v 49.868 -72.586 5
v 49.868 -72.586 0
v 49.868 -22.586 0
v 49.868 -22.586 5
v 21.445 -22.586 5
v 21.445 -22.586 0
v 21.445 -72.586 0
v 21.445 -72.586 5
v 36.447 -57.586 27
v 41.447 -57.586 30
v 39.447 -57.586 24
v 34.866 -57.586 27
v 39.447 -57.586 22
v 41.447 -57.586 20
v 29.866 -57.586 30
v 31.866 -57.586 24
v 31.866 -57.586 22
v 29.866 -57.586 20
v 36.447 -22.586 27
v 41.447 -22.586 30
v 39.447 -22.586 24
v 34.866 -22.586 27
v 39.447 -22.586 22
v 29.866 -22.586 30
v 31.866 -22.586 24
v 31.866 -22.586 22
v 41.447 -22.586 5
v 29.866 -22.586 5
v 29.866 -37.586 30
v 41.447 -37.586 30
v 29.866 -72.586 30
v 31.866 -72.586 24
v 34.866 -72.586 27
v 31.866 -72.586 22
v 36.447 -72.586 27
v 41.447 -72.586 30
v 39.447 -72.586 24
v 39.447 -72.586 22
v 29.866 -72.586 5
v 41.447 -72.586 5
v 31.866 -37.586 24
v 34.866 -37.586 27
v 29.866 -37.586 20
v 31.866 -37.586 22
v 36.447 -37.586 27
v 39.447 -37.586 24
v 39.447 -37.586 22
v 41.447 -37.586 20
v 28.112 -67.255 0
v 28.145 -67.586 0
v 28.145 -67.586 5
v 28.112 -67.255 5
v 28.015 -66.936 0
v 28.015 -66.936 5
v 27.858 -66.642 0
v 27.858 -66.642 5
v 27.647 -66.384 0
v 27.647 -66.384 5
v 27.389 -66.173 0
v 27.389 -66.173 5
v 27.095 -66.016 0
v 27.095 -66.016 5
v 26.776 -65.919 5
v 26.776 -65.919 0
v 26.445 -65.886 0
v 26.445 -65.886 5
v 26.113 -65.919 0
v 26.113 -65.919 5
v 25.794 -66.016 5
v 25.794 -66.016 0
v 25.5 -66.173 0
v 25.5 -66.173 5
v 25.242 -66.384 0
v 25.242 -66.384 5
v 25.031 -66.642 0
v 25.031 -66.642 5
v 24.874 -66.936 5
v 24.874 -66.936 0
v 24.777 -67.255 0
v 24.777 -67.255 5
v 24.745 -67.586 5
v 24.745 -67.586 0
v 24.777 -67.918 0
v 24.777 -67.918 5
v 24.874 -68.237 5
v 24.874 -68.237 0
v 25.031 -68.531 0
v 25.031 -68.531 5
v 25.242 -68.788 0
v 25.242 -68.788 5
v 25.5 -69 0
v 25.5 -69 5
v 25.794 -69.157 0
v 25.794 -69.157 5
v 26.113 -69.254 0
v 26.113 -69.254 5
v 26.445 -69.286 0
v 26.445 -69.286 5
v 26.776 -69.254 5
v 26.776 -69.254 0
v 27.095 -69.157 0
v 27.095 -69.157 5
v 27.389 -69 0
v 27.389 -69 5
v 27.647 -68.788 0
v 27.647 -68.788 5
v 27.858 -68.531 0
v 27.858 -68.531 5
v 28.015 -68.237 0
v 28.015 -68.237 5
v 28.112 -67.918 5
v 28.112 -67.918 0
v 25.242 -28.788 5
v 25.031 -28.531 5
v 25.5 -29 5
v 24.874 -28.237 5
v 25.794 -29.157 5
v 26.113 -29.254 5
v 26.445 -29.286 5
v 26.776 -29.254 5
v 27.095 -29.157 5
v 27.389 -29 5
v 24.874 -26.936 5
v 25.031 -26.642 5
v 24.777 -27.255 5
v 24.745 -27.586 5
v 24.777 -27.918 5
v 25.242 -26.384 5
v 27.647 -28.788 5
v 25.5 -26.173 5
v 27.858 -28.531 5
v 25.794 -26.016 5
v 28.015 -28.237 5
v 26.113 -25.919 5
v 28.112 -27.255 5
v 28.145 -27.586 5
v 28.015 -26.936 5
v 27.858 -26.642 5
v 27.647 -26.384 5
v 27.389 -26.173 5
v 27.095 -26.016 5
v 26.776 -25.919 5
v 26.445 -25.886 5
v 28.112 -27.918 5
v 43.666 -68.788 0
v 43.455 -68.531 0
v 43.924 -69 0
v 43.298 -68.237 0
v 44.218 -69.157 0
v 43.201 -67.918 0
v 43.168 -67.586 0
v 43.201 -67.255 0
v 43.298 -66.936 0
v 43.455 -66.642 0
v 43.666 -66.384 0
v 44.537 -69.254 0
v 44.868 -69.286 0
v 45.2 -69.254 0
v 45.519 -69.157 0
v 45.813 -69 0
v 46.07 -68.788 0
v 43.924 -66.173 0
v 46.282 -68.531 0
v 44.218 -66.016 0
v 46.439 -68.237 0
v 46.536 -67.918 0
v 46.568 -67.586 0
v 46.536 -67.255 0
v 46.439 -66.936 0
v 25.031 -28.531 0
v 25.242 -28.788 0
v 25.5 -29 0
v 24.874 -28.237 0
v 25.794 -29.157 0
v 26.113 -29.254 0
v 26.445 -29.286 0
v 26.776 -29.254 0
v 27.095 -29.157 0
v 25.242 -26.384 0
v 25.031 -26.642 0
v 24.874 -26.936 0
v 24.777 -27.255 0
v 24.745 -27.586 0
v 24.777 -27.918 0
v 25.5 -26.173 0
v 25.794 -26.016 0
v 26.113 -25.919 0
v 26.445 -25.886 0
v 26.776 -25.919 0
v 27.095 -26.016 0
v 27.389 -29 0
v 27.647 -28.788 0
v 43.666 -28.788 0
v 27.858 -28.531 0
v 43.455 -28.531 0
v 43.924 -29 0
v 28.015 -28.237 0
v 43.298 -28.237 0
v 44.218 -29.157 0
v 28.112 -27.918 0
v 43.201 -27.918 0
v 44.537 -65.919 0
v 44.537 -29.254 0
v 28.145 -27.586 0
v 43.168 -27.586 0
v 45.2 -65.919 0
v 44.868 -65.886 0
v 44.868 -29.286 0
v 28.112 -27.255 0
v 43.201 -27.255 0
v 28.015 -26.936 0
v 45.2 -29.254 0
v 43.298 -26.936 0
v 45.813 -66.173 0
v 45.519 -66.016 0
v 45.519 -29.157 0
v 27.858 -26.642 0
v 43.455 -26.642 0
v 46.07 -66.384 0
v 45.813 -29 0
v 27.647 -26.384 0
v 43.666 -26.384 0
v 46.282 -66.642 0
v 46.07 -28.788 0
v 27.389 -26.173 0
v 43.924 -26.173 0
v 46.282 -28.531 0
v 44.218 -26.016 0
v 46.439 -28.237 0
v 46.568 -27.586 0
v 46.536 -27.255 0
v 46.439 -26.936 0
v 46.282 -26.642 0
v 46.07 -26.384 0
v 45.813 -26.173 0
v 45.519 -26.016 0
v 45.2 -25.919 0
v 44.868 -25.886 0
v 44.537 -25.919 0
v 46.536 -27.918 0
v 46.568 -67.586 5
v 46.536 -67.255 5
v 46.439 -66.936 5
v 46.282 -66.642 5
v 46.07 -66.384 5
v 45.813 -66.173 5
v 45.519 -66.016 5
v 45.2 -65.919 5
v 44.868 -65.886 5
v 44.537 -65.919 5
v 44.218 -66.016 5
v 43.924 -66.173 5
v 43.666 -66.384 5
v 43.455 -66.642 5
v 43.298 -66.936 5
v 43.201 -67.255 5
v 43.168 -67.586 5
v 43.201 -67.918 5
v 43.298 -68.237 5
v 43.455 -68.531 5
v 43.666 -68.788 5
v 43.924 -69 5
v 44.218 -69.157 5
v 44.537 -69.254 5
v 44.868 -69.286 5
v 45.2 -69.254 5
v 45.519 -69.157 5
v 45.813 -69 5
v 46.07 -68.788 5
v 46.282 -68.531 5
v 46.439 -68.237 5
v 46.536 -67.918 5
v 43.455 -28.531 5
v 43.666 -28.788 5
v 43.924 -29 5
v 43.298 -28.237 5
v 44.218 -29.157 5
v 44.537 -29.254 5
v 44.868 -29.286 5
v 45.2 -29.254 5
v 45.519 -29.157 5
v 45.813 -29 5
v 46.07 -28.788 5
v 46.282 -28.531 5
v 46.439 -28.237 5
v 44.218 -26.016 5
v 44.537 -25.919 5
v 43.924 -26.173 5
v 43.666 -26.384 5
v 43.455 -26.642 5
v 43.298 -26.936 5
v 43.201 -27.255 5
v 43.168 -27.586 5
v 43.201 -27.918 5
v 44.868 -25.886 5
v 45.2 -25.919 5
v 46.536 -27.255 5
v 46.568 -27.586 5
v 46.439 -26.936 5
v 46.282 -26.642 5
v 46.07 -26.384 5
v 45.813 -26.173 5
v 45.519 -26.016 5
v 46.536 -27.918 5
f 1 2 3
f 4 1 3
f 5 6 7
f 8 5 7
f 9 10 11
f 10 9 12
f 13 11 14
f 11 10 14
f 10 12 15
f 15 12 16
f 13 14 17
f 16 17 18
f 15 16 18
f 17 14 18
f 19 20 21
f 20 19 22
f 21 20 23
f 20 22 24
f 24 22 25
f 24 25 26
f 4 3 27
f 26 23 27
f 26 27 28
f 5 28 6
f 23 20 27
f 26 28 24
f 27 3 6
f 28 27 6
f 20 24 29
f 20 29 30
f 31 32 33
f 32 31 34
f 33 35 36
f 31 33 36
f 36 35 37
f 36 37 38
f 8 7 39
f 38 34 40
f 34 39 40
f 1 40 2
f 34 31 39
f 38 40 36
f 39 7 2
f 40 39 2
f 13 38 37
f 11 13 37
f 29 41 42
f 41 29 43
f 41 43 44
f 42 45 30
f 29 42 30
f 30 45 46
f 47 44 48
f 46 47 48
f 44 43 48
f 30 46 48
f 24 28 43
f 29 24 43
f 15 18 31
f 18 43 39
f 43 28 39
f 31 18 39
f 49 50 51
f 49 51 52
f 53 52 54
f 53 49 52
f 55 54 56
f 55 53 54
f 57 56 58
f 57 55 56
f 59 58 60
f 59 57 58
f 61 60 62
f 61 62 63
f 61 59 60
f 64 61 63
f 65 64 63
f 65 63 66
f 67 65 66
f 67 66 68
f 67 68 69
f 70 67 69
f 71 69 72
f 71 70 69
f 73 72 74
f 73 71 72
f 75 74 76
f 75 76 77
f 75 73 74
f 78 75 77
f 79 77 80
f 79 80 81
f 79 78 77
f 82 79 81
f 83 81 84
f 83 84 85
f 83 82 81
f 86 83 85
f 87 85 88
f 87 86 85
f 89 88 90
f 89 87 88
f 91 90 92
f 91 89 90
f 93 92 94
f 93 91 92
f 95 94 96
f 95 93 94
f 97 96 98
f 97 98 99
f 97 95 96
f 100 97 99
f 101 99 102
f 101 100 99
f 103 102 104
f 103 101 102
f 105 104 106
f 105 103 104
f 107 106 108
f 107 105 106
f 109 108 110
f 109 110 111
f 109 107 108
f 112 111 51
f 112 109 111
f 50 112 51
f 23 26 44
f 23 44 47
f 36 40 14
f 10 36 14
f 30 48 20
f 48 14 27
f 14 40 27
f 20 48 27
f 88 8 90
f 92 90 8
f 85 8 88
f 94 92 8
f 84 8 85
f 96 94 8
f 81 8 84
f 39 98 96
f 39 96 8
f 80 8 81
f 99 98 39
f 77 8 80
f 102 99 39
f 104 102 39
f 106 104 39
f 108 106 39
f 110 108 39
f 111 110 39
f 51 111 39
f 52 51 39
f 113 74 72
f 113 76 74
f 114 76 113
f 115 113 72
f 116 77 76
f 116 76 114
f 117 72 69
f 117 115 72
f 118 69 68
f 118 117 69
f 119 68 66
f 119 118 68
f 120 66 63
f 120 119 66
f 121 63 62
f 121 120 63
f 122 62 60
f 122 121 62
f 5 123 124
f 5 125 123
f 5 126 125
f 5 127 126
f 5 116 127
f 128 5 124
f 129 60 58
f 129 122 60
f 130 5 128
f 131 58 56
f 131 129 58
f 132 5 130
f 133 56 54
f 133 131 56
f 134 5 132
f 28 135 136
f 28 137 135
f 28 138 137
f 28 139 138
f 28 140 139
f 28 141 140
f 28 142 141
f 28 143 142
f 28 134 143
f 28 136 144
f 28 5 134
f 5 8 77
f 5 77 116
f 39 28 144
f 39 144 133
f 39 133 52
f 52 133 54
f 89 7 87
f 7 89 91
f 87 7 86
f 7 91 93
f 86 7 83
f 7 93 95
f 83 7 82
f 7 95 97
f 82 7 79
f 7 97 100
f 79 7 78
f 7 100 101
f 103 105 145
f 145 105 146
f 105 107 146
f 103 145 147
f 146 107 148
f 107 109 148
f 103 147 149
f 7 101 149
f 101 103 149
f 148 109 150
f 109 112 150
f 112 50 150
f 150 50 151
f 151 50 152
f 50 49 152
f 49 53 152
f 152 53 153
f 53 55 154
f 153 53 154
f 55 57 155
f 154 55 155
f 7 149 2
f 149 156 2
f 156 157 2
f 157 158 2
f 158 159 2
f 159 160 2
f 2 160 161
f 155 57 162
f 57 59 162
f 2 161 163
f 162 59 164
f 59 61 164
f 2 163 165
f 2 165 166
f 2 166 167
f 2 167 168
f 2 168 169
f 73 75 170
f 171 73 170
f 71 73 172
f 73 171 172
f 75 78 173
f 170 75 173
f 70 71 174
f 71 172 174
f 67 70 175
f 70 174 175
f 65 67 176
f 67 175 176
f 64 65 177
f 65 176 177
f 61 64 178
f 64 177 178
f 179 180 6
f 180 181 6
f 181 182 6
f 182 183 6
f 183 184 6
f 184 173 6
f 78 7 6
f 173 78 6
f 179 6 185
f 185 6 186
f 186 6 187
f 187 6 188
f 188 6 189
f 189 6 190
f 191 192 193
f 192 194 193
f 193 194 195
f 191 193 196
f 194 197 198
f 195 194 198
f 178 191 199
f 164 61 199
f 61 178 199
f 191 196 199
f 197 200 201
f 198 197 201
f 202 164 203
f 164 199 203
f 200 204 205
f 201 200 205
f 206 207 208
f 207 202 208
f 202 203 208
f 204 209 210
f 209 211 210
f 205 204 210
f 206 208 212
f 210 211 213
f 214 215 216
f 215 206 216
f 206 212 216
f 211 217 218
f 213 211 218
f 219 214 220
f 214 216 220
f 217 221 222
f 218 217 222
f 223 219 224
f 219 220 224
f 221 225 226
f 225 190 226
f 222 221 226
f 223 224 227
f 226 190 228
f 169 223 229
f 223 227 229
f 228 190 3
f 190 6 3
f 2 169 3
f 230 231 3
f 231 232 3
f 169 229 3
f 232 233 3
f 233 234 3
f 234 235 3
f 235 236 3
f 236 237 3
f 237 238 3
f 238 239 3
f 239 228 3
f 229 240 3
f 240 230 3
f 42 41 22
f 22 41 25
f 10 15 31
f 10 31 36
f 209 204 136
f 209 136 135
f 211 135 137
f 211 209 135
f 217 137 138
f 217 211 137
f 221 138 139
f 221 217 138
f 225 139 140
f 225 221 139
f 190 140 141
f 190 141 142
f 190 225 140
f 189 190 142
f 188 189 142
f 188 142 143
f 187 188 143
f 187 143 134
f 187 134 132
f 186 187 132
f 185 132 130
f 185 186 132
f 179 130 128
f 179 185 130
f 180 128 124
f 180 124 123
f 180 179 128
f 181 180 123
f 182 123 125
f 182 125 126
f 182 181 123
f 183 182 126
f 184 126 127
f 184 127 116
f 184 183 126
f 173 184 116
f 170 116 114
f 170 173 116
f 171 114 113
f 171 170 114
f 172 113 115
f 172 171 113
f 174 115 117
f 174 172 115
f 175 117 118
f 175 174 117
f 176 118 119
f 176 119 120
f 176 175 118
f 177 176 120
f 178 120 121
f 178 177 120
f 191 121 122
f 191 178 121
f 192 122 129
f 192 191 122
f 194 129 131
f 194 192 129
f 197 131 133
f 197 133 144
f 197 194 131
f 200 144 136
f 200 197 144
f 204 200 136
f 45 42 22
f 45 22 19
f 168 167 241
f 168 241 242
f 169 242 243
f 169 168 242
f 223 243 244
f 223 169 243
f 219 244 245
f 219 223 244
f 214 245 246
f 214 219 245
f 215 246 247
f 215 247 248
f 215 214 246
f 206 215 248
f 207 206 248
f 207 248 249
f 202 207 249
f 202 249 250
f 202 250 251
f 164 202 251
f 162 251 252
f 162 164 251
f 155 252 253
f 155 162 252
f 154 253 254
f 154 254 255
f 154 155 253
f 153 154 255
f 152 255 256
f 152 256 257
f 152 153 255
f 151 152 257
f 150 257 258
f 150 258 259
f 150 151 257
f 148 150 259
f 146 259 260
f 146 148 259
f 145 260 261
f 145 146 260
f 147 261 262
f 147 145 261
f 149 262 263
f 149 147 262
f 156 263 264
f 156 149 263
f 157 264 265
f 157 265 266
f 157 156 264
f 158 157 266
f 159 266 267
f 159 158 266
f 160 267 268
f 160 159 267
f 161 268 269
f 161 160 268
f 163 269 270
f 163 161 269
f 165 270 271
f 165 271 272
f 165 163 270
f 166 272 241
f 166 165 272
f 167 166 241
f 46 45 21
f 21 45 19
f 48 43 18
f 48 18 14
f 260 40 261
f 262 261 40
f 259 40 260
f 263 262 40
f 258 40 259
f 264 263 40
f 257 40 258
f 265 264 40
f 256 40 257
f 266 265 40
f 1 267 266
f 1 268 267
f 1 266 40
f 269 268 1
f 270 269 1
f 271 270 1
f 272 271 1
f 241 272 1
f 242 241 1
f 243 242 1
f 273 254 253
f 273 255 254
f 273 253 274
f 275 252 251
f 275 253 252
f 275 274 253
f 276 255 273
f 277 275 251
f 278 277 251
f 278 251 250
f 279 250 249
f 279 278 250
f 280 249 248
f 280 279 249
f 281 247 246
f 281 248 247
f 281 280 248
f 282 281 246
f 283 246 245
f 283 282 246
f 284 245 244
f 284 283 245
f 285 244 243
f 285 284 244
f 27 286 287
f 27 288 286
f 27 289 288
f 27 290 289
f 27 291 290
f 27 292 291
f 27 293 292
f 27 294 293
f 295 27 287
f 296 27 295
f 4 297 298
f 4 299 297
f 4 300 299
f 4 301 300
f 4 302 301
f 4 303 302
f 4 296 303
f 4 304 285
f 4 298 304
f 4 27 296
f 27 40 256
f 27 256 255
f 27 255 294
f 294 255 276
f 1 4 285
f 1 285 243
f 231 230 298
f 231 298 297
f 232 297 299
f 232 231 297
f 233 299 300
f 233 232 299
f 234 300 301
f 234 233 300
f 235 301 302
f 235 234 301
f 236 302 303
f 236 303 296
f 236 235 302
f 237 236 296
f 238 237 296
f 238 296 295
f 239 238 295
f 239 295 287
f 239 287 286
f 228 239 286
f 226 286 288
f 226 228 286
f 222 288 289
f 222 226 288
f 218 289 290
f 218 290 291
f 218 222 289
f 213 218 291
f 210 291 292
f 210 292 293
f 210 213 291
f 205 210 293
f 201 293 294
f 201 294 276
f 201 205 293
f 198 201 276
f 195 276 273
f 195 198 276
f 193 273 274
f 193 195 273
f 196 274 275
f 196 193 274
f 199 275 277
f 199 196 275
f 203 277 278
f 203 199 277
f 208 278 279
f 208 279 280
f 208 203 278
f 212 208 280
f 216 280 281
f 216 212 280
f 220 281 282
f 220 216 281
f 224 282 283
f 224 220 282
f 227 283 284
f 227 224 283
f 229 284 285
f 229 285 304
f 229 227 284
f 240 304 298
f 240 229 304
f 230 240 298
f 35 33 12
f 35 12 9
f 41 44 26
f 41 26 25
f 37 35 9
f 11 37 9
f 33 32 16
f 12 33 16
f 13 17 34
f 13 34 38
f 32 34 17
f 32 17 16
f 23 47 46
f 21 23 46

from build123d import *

# Parameters (mm, degrees)
F0_R     = 1.7
F1_DEPTH = 5
F2_DEPTH = 30
F3_DEPTH = 20
F4_W     = 7.581357
F4_H     = 5
F5_DEPTH = 50.001
F6_SIZE  = 3


with BuildPart() as f1:
    # F0 (on Top) → F1 (new body)
    with BuildSketch(Plane.XY):
        Polygon((29.865686, -22.586415), (21.444556, -22.586415), (21.444556, -47.586415), (21.444556, -72.586415), (29.865686, -72.586415), (29.865686, -57.586415), (29.865686, -47.586415), (29.865686, -37.586415), align=None)
        with Locations((26.444556, -67.586415)):
            Circle(F0_R, mode=Mode.SUBTRACT)
        with Locations((26.444556, -27.586415)):
            Circle(F0_R, mode=Mode.SUBTRACT)
        Polygon((49.868173, -22.586415), (41.447043, -22.586415), (41.447043, -37.586415), (41.447043, -47.586415), (41.447043, -57.586415), (41.447043, -72.586415), (49.868173, -72.586415), (49.868173, -47.586415), align=None)
        with Locations((44.868173, -67.586415)):
            Circle(F0_R, mode=Mode.SUBTRACT)
        with Locations((44.868173, -27.586415)):
            Circle(F0_R, mode=Mode.SUBTRACT)
    extrude(amount=F1_DEPTH)

    # F0 (on Top) → F2 (join)
    with BuildSketch(Plane.XY):
        Polygon((35.656365, -22.586415), (29.865686, -22.586415), (29.865686, -37.586415), (35.656365, -37.586415), (41.447043, -37.586415), (41.447043, -22.586415), align=None)
        Polygon((29.865686, -57.586415), (29.865686, -72.586415), (35.656365, -72.586415), (41.447043, -72.586415), (41.447043, -57.586415), (35.656365, -57.586415), align=None)
    extrude(amount=F2_DEPTH)

    # F0 (on Top) → F3 (join)
    with BuildSketch(Plane.XY):
        Polygon((35.656365, -37.586415), (29.865686, -37.586415), (29.865686, -47.586415), (29.865686, -57.586415), (35.656365, -57.586415), (41.447043, -57.586415), (41.447043, -47.586415), (41.447043, -37.586415), align=None)
    extrude(amount=F3_DEPTH)

    # F4 (on face) → F5 (cut, through all)
    with BuildSketch(Plane.XZ.offset(72.586415)):
        with Locations((35.656365, 24.5)):
            Rectangle(F4_W, F4_H)
    extrude(amount=-F5_DEPTH, mode=Mode.SUBTRACT)

    # F6
    f6_edges = [f1.edges().sort_by_distance(p)[0] for p in [
        (31.865686, -30.086415, 27),
        (31.865686, -65.086415, 27),
        (39.447043, -30.086415, 27),
        (39.447043, -65.086415, 27),
    ]]
    chamfer(f6_edges, length=F6_SIZE)


solid = f1.part
